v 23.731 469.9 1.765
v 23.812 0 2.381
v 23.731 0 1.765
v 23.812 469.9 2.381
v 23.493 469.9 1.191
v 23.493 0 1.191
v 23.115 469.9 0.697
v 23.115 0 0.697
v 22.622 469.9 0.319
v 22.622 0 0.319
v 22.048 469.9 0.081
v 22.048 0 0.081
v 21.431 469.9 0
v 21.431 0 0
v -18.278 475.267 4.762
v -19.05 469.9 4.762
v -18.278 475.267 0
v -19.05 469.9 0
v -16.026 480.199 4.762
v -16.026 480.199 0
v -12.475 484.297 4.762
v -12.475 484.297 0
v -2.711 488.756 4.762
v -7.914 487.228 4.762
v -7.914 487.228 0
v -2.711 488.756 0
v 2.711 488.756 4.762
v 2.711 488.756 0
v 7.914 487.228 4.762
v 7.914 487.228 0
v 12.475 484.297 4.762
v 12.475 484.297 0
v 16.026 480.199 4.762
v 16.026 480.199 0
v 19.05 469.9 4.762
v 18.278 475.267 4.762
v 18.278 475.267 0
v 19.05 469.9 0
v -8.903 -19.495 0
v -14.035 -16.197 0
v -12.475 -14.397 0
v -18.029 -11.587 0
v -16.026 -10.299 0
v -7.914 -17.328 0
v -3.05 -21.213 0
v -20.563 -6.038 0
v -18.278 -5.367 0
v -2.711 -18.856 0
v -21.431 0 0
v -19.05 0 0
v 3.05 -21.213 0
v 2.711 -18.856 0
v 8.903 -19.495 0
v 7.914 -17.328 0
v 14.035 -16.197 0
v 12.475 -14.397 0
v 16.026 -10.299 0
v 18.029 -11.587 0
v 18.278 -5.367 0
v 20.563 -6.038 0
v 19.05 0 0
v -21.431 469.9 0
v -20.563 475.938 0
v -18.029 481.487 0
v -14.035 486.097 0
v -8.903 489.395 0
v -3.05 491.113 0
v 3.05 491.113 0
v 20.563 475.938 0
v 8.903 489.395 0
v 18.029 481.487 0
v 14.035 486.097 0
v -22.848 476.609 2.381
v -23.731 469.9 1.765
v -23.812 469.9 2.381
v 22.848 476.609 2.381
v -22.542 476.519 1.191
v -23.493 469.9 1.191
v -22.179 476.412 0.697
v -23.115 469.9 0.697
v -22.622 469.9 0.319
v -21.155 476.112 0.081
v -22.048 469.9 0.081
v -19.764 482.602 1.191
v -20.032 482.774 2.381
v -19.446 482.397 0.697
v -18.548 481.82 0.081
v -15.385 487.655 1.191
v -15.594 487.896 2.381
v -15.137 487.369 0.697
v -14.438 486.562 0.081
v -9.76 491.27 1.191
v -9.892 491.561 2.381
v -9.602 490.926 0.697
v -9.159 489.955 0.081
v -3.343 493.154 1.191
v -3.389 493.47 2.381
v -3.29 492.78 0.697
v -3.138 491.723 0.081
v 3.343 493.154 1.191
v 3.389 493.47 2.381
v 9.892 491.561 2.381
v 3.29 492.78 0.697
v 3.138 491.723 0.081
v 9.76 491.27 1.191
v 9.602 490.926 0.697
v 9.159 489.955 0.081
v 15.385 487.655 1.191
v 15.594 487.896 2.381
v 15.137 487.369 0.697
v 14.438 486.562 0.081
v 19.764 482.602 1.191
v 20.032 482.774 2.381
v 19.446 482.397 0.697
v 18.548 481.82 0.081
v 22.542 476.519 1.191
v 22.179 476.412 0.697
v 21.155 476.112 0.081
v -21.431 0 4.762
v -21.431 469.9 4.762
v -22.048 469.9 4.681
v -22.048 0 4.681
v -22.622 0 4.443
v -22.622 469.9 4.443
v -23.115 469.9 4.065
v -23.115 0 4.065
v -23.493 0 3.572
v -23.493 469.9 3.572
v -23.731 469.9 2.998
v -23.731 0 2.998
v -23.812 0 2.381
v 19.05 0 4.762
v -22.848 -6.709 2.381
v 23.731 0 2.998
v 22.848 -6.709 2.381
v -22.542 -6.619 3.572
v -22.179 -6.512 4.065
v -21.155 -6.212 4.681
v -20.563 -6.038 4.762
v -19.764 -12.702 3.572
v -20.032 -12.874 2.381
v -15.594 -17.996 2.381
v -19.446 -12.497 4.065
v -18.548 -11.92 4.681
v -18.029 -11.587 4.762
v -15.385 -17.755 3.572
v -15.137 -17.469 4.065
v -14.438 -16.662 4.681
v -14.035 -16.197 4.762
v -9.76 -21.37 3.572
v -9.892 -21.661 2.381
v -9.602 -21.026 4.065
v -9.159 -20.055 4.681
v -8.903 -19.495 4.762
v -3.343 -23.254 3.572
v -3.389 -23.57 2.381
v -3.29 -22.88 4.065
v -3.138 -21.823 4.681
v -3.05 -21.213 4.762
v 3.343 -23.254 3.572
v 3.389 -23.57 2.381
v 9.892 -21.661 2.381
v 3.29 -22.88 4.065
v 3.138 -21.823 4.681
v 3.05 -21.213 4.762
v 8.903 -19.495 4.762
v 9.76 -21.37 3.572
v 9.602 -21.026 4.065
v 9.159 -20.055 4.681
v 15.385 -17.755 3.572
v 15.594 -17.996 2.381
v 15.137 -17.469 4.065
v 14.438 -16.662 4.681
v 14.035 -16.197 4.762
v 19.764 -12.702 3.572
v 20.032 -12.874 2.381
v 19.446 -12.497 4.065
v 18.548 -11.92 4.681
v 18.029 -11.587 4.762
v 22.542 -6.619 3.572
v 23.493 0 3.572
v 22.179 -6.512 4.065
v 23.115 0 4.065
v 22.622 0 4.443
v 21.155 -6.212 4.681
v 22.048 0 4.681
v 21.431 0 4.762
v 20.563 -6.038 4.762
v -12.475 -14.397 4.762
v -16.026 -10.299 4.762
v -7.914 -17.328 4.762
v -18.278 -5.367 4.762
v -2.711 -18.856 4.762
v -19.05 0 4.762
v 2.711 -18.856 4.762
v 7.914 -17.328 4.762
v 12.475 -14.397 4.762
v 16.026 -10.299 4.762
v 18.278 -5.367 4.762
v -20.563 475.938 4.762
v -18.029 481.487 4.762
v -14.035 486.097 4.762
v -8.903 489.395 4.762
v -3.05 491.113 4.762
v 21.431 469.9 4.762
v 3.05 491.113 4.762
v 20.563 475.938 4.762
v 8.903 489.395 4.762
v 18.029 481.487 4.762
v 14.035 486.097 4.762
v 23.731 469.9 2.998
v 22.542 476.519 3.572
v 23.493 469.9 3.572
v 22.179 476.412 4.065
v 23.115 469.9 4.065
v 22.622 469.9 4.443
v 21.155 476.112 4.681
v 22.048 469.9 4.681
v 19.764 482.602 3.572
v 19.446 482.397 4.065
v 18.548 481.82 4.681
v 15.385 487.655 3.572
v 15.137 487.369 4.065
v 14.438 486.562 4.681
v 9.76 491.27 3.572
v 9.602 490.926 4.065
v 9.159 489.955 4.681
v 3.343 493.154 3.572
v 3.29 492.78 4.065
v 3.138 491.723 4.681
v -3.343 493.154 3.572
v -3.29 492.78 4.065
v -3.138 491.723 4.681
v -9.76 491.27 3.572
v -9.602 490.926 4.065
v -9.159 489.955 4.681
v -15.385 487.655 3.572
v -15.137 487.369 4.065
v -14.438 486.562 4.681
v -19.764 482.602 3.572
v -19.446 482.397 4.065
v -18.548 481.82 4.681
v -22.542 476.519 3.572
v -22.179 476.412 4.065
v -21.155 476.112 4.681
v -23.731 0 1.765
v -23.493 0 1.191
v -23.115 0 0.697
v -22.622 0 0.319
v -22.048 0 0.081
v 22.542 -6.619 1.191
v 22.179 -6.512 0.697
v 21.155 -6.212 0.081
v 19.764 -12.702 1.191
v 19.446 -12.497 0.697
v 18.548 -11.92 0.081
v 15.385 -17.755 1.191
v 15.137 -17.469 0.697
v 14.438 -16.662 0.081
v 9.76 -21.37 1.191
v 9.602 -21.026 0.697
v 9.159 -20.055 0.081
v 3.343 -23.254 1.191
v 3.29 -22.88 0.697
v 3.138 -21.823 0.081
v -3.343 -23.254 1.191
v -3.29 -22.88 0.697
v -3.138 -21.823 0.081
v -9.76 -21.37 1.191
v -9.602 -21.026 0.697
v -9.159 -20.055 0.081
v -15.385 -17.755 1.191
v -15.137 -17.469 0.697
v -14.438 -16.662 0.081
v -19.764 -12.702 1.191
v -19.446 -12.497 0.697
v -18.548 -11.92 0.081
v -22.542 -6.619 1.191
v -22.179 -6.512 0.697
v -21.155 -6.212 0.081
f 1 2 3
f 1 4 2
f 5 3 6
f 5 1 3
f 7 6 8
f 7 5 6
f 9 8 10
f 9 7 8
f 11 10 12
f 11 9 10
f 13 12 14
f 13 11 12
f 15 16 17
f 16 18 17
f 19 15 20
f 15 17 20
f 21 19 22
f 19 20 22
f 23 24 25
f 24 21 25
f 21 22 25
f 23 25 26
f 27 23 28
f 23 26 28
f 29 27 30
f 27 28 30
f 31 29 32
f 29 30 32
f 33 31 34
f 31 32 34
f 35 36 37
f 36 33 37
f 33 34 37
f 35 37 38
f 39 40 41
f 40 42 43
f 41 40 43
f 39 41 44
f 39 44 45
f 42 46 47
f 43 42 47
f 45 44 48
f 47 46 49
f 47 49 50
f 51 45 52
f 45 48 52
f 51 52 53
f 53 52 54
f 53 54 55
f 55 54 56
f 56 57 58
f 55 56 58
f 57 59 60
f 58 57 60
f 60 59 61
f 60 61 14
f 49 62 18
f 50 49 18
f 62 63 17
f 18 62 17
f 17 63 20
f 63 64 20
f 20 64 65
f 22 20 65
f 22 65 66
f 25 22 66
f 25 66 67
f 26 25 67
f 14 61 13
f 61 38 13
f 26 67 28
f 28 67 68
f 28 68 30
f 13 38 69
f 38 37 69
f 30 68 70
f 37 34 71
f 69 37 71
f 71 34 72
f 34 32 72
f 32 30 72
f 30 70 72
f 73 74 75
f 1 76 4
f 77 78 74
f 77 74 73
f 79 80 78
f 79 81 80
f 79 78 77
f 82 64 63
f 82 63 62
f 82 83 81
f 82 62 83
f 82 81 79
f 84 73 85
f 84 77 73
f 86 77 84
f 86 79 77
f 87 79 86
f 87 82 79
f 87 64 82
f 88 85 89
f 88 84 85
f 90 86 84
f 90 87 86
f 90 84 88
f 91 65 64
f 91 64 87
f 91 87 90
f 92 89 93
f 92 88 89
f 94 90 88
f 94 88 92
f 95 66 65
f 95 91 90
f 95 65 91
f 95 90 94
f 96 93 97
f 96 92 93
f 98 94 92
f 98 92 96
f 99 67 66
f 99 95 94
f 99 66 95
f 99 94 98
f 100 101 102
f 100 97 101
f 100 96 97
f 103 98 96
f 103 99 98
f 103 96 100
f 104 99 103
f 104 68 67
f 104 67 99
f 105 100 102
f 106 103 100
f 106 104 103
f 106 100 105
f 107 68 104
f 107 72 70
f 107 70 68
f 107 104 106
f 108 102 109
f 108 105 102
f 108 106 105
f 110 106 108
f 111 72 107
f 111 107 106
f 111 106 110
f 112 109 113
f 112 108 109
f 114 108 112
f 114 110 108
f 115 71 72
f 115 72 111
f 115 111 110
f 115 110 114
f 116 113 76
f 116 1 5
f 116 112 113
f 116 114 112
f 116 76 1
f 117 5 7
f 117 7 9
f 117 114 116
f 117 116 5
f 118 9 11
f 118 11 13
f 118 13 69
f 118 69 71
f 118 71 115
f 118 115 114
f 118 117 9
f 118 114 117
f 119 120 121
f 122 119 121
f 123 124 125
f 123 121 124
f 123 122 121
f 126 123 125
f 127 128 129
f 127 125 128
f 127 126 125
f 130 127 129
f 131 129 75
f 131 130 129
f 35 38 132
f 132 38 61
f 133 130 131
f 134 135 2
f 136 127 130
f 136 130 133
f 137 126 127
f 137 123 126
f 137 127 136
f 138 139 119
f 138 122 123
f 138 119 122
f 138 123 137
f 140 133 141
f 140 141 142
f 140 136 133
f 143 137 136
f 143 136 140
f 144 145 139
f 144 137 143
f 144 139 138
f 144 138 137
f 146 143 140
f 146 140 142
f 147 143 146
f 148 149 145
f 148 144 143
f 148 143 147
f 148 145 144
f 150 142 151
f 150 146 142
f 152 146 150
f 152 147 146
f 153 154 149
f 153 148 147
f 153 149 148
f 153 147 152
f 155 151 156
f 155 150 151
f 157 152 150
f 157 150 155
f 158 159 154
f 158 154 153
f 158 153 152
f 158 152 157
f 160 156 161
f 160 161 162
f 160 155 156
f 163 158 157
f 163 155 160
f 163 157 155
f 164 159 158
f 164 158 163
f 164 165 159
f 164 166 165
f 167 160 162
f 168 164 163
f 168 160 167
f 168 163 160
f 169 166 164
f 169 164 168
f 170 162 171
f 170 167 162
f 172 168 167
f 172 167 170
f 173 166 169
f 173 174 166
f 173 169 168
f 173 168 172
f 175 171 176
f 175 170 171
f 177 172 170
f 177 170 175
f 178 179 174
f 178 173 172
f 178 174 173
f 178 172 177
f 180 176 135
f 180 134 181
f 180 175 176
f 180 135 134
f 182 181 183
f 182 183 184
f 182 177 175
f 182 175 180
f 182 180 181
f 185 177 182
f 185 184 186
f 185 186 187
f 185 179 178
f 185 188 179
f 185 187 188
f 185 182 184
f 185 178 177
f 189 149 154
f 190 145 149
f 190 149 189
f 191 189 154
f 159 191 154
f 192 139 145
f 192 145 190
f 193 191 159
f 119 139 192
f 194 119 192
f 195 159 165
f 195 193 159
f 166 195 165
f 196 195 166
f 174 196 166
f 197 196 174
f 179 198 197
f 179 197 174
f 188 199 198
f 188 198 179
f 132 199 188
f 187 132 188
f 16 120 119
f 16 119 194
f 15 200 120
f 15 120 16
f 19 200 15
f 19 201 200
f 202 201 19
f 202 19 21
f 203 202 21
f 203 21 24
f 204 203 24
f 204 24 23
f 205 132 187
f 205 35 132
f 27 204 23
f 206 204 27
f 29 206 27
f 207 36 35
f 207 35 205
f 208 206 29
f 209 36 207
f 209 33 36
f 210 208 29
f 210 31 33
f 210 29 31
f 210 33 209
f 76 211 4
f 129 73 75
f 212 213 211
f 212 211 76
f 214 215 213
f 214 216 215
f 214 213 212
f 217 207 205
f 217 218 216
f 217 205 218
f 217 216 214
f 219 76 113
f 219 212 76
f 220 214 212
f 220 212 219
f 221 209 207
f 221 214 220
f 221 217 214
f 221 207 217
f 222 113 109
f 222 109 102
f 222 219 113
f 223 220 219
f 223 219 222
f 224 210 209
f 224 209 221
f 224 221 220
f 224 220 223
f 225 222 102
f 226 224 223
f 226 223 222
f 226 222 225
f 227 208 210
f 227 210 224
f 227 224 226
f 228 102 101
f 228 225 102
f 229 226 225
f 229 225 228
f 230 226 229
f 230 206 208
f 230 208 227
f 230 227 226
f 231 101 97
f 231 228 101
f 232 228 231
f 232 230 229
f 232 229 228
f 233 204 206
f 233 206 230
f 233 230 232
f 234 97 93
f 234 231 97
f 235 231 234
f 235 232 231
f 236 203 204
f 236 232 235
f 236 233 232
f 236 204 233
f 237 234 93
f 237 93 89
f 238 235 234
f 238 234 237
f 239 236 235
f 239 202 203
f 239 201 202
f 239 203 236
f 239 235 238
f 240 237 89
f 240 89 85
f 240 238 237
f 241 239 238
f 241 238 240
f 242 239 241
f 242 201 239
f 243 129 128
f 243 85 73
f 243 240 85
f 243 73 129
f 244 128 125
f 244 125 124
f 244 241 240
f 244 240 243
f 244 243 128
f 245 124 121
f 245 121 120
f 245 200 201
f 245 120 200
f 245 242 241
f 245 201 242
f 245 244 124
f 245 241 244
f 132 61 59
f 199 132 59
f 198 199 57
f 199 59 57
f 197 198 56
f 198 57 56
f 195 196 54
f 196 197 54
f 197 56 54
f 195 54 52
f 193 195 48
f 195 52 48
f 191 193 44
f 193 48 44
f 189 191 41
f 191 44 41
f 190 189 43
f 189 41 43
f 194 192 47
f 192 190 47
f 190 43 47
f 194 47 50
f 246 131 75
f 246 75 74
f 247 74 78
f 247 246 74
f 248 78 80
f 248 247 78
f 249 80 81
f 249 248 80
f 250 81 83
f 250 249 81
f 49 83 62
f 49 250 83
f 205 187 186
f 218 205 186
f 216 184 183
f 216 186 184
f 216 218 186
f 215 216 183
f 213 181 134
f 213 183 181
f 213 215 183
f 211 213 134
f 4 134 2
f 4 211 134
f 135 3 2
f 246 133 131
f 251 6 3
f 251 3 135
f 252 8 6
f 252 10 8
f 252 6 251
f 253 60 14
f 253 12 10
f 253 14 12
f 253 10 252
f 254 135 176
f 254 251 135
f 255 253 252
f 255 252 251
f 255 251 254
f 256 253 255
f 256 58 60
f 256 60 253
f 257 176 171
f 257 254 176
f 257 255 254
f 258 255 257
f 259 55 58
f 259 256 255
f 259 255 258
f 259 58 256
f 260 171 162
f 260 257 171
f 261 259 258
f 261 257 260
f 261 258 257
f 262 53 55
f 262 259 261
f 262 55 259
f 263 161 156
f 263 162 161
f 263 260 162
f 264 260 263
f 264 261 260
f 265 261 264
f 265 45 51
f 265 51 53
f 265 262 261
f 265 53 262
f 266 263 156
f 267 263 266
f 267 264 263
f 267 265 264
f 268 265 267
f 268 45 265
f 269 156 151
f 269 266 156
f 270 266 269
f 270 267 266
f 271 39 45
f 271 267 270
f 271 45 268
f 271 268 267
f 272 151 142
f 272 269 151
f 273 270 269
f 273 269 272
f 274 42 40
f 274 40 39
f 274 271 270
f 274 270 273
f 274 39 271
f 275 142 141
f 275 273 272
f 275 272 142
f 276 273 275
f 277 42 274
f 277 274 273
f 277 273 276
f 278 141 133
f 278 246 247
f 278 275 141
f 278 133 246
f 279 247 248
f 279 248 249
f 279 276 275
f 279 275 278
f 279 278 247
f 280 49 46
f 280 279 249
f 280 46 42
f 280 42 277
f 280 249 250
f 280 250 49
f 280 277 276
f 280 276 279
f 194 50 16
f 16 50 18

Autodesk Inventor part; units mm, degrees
ref_plane "YZ Plane" through (0, 0, 0) normal (1, 0, 0) x (0, 1, 0)
ref_plane "XZ Plane" through (0, 0, 0) normal (0, 1, 0) x (-1, 0, 0)
ref_plane "XY Plane" through (0, 0, 0) normal (0, 0, 1) x (1, 0, 0)
sketch "Sketch1" plane through (0, 0, 0) normal (0, 0, 1) x (1, 0, 0)
  arc A0 (-19.05, 0) -> (19.05, 0) centre (0, 0) ccw
  arc A1 (19.05, 469.9) -> (-19.05, 469.9) centre (0, 469.9) ccw
  line L0 (-19.05, 0) -> (-19.05, 469.9)
  line L1 (19.05, 469.9) -> (19.05, 0)
  arc A2 (23.8125, 469.9) -> (-23.8125, 469.9) centre (0, 469.9) ccw
  arc A3 (-23.8125, 0) -> (23.8125, 0) centre (0, 0) ccw
  line L2 (-23.8125, 469.9) -> (-23.8125, 0)
  line L3 (23.8125, 0) -> (23.8125, 469.9)
  dimension "d0" = 469.9
  dimension "d1" = 19.05
  dimension "d2" = 4.7625
extrude "Extrusion1" add sketch "Sketch1" along normal blind 4.7625
fillet "Fillet1" radius 2.3813 8 edges at (0, 493.7125, 4.7625) (23.8125, 234.95, 4.7625) (0, -23.8125, 4.7625) (-23.8125, 234.95, 4.7625) (0, -23.8125, 0) (23.8125, 234.95, 0) (0, 493.7125, 0) (-23.8125, 234.95, 0)
properties part number "Belt_VerticalConveyor_Rear"
